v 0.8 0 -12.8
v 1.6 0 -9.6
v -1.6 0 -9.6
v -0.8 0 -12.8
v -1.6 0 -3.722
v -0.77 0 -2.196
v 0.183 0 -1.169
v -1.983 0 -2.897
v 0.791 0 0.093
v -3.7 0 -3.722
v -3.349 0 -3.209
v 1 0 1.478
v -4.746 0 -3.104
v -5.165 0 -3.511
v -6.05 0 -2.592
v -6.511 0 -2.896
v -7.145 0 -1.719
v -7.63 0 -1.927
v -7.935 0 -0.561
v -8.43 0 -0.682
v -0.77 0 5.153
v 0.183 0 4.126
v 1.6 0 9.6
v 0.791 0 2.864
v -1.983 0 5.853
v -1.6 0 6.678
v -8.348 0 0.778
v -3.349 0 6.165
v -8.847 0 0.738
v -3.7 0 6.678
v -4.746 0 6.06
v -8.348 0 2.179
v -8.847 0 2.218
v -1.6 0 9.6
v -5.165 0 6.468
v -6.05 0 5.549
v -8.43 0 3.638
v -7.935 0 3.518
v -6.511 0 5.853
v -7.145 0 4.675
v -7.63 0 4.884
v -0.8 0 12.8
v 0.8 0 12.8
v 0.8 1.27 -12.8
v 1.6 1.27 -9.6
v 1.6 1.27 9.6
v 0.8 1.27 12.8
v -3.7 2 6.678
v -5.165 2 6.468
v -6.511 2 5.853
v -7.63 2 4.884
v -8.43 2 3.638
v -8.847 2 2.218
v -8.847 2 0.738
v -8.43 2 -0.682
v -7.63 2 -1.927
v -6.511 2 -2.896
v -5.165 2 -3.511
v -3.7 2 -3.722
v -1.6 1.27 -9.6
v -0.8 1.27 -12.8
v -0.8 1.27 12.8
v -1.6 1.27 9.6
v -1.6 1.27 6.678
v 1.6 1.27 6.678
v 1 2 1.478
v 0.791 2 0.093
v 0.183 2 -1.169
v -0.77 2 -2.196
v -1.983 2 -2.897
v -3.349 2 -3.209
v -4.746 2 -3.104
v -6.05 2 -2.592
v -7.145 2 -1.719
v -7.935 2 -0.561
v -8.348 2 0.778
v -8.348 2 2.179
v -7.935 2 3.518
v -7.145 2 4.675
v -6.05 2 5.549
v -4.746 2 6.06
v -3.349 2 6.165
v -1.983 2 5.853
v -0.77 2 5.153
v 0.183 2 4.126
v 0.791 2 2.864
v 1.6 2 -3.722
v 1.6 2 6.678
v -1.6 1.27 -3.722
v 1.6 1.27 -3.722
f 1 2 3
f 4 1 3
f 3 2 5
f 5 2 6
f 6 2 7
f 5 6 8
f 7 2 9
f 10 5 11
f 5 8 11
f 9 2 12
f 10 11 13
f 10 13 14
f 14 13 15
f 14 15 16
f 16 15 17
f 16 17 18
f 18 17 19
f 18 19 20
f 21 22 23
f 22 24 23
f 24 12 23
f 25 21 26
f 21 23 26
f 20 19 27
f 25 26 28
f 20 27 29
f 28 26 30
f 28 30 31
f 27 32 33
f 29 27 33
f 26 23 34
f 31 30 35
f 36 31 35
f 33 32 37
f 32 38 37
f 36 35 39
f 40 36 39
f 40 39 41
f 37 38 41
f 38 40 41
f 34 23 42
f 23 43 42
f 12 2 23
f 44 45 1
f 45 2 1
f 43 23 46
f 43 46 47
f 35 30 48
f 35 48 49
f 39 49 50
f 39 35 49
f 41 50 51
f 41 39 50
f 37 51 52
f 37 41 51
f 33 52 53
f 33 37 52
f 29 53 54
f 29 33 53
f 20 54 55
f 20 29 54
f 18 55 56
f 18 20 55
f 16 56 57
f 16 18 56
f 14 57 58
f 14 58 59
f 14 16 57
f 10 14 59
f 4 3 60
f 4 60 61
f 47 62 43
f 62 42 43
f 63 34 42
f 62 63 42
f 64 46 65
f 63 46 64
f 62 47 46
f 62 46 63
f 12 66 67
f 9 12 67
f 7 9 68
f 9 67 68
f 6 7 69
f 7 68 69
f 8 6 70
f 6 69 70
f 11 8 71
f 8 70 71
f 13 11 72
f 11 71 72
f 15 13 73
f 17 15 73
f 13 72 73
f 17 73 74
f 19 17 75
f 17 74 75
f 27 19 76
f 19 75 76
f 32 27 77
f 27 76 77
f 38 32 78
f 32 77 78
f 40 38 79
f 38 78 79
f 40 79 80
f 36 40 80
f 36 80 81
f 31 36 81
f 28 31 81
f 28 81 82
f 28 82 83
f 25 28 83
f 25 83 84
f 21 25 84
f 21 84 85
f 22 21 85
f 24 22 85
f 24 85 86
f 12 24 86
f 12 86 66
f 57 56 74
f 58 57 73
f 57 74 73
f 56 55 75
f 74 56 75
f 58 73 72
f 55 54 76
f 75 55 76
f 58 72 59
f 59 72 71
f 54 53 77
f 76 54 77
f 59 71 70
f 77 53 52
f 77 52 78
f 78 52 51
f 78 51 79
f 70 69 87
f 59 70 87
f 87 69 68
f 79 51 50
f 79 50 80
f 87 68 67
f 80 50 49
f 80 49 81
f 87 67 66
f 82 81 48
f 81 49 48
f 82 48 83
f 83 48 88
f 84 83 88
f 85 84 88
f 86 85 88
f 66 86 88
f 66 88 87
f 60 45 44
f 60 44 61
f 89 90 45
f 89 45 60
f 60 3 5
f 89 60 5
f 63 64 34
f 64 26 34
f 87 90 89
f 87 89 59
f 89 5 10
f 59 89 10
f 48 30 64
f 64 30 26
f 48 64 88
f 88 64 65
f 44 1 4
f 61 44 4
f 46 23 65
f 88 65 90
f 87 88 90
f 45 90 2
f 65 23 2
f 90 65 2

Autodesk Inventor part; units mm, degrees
ref_plane "YZ Plane" through (0, 0, 0) normal (1, 0, 0) x (0, 1, 0)
ref_plane "XZ Plane" through (0, 0, 0) normal (0, 1, 0) x (-1, 0, 0)
ref_plane "XY Plane" through (0, 0, 0) normal (0, 0, 1) x (1, 0, 0)
sketch "Sketch1" plane through (0, 0, 0) normal (0, 1, 0) x (-1, 0, 0)
  line L0 (0.8, 12.8) -> (-0.8, 12.8)
  line L1 (-1.6, 9.6) -> (-1.6, -9.6)
  line L2 (-0.8, -12.8) -> (0.8, -12.8)
  line L3 (1.6, -9.6) -> (1.6, 9.6)
  line L4 (1.6, 9.6) -> (0.8, 12.8)
  line L5 (-1.6, 9.6) -> (-0.8, 12.8)
  line L6 (1.6, -9.6) -> (0.8, -12.8)
  line L7 (-1.6, -9.6) -> (-0.8, -12.8)
  line L8 (-1.6, 6.2) -> (-1.6, -4.2)
  point P0 (0, 0)
  point P1 (1.6, 12.8)
  point P2 (-1.6, 12.8)
  point P3 (1.6, -12.8)
  dimension "d0" = 25.6
  dimension "d1" = 3.2
  dimension "d2" = 1.6
  dimension "d3" = 12.8
  dimension "d4" = 3.2
  dimension "d12" = 0
extrude "Extrusion1" add sketch "Sketch1" along normal blind 1.27
sketch "Sketch4" plane through (0, 0, 0) normal (0, -1, 0) x (1, 0, 0)
  line L0 (1.6, -3.7217) -> (-3.7, -3.7217)
  line L1 (-3.7, 6.6783) -> (1.6, 6.6783)
  line L2 (1.6, 6.6783) -> (1.6, -3.7217)
  line L3 (1.6, 9.6) -> (1.6, -9.6) projected
  arc A0 (-3.7, 6.6783) -> (-3.7, -3.7217) centre (-3.7, 1.4783) ccw
  point P0 (0, 0)
  dimension "d23" = 10.4
  dimension "d24" = 0
  dimension "d27" = 5.3
extrude "Extrusion2" add sketch "Sketch4" against normal blind 2
sketch "Sketch5" plane through (0, 2, 0) normal (0, 1, 0) x (1, 0, 0)
  circle A0 centre (-3.7, -1.4783) radius 4.7
  line L0 (1.6, -6.6783) -> (1.6, 3.7217) projected
  line L1 (-3.7, -6.6783) -> (1.6, -6.6783) projected
  point P0 (0, 0)
  dimension "d30" = 9.4
  dimension "d31" = 5.3
  dimension "d32" = 5.2
extrude "Extrusion3" cut sketch "Sketch5" against normal blind 2
properties part number "Headbar_D_Shape_unfinished"
